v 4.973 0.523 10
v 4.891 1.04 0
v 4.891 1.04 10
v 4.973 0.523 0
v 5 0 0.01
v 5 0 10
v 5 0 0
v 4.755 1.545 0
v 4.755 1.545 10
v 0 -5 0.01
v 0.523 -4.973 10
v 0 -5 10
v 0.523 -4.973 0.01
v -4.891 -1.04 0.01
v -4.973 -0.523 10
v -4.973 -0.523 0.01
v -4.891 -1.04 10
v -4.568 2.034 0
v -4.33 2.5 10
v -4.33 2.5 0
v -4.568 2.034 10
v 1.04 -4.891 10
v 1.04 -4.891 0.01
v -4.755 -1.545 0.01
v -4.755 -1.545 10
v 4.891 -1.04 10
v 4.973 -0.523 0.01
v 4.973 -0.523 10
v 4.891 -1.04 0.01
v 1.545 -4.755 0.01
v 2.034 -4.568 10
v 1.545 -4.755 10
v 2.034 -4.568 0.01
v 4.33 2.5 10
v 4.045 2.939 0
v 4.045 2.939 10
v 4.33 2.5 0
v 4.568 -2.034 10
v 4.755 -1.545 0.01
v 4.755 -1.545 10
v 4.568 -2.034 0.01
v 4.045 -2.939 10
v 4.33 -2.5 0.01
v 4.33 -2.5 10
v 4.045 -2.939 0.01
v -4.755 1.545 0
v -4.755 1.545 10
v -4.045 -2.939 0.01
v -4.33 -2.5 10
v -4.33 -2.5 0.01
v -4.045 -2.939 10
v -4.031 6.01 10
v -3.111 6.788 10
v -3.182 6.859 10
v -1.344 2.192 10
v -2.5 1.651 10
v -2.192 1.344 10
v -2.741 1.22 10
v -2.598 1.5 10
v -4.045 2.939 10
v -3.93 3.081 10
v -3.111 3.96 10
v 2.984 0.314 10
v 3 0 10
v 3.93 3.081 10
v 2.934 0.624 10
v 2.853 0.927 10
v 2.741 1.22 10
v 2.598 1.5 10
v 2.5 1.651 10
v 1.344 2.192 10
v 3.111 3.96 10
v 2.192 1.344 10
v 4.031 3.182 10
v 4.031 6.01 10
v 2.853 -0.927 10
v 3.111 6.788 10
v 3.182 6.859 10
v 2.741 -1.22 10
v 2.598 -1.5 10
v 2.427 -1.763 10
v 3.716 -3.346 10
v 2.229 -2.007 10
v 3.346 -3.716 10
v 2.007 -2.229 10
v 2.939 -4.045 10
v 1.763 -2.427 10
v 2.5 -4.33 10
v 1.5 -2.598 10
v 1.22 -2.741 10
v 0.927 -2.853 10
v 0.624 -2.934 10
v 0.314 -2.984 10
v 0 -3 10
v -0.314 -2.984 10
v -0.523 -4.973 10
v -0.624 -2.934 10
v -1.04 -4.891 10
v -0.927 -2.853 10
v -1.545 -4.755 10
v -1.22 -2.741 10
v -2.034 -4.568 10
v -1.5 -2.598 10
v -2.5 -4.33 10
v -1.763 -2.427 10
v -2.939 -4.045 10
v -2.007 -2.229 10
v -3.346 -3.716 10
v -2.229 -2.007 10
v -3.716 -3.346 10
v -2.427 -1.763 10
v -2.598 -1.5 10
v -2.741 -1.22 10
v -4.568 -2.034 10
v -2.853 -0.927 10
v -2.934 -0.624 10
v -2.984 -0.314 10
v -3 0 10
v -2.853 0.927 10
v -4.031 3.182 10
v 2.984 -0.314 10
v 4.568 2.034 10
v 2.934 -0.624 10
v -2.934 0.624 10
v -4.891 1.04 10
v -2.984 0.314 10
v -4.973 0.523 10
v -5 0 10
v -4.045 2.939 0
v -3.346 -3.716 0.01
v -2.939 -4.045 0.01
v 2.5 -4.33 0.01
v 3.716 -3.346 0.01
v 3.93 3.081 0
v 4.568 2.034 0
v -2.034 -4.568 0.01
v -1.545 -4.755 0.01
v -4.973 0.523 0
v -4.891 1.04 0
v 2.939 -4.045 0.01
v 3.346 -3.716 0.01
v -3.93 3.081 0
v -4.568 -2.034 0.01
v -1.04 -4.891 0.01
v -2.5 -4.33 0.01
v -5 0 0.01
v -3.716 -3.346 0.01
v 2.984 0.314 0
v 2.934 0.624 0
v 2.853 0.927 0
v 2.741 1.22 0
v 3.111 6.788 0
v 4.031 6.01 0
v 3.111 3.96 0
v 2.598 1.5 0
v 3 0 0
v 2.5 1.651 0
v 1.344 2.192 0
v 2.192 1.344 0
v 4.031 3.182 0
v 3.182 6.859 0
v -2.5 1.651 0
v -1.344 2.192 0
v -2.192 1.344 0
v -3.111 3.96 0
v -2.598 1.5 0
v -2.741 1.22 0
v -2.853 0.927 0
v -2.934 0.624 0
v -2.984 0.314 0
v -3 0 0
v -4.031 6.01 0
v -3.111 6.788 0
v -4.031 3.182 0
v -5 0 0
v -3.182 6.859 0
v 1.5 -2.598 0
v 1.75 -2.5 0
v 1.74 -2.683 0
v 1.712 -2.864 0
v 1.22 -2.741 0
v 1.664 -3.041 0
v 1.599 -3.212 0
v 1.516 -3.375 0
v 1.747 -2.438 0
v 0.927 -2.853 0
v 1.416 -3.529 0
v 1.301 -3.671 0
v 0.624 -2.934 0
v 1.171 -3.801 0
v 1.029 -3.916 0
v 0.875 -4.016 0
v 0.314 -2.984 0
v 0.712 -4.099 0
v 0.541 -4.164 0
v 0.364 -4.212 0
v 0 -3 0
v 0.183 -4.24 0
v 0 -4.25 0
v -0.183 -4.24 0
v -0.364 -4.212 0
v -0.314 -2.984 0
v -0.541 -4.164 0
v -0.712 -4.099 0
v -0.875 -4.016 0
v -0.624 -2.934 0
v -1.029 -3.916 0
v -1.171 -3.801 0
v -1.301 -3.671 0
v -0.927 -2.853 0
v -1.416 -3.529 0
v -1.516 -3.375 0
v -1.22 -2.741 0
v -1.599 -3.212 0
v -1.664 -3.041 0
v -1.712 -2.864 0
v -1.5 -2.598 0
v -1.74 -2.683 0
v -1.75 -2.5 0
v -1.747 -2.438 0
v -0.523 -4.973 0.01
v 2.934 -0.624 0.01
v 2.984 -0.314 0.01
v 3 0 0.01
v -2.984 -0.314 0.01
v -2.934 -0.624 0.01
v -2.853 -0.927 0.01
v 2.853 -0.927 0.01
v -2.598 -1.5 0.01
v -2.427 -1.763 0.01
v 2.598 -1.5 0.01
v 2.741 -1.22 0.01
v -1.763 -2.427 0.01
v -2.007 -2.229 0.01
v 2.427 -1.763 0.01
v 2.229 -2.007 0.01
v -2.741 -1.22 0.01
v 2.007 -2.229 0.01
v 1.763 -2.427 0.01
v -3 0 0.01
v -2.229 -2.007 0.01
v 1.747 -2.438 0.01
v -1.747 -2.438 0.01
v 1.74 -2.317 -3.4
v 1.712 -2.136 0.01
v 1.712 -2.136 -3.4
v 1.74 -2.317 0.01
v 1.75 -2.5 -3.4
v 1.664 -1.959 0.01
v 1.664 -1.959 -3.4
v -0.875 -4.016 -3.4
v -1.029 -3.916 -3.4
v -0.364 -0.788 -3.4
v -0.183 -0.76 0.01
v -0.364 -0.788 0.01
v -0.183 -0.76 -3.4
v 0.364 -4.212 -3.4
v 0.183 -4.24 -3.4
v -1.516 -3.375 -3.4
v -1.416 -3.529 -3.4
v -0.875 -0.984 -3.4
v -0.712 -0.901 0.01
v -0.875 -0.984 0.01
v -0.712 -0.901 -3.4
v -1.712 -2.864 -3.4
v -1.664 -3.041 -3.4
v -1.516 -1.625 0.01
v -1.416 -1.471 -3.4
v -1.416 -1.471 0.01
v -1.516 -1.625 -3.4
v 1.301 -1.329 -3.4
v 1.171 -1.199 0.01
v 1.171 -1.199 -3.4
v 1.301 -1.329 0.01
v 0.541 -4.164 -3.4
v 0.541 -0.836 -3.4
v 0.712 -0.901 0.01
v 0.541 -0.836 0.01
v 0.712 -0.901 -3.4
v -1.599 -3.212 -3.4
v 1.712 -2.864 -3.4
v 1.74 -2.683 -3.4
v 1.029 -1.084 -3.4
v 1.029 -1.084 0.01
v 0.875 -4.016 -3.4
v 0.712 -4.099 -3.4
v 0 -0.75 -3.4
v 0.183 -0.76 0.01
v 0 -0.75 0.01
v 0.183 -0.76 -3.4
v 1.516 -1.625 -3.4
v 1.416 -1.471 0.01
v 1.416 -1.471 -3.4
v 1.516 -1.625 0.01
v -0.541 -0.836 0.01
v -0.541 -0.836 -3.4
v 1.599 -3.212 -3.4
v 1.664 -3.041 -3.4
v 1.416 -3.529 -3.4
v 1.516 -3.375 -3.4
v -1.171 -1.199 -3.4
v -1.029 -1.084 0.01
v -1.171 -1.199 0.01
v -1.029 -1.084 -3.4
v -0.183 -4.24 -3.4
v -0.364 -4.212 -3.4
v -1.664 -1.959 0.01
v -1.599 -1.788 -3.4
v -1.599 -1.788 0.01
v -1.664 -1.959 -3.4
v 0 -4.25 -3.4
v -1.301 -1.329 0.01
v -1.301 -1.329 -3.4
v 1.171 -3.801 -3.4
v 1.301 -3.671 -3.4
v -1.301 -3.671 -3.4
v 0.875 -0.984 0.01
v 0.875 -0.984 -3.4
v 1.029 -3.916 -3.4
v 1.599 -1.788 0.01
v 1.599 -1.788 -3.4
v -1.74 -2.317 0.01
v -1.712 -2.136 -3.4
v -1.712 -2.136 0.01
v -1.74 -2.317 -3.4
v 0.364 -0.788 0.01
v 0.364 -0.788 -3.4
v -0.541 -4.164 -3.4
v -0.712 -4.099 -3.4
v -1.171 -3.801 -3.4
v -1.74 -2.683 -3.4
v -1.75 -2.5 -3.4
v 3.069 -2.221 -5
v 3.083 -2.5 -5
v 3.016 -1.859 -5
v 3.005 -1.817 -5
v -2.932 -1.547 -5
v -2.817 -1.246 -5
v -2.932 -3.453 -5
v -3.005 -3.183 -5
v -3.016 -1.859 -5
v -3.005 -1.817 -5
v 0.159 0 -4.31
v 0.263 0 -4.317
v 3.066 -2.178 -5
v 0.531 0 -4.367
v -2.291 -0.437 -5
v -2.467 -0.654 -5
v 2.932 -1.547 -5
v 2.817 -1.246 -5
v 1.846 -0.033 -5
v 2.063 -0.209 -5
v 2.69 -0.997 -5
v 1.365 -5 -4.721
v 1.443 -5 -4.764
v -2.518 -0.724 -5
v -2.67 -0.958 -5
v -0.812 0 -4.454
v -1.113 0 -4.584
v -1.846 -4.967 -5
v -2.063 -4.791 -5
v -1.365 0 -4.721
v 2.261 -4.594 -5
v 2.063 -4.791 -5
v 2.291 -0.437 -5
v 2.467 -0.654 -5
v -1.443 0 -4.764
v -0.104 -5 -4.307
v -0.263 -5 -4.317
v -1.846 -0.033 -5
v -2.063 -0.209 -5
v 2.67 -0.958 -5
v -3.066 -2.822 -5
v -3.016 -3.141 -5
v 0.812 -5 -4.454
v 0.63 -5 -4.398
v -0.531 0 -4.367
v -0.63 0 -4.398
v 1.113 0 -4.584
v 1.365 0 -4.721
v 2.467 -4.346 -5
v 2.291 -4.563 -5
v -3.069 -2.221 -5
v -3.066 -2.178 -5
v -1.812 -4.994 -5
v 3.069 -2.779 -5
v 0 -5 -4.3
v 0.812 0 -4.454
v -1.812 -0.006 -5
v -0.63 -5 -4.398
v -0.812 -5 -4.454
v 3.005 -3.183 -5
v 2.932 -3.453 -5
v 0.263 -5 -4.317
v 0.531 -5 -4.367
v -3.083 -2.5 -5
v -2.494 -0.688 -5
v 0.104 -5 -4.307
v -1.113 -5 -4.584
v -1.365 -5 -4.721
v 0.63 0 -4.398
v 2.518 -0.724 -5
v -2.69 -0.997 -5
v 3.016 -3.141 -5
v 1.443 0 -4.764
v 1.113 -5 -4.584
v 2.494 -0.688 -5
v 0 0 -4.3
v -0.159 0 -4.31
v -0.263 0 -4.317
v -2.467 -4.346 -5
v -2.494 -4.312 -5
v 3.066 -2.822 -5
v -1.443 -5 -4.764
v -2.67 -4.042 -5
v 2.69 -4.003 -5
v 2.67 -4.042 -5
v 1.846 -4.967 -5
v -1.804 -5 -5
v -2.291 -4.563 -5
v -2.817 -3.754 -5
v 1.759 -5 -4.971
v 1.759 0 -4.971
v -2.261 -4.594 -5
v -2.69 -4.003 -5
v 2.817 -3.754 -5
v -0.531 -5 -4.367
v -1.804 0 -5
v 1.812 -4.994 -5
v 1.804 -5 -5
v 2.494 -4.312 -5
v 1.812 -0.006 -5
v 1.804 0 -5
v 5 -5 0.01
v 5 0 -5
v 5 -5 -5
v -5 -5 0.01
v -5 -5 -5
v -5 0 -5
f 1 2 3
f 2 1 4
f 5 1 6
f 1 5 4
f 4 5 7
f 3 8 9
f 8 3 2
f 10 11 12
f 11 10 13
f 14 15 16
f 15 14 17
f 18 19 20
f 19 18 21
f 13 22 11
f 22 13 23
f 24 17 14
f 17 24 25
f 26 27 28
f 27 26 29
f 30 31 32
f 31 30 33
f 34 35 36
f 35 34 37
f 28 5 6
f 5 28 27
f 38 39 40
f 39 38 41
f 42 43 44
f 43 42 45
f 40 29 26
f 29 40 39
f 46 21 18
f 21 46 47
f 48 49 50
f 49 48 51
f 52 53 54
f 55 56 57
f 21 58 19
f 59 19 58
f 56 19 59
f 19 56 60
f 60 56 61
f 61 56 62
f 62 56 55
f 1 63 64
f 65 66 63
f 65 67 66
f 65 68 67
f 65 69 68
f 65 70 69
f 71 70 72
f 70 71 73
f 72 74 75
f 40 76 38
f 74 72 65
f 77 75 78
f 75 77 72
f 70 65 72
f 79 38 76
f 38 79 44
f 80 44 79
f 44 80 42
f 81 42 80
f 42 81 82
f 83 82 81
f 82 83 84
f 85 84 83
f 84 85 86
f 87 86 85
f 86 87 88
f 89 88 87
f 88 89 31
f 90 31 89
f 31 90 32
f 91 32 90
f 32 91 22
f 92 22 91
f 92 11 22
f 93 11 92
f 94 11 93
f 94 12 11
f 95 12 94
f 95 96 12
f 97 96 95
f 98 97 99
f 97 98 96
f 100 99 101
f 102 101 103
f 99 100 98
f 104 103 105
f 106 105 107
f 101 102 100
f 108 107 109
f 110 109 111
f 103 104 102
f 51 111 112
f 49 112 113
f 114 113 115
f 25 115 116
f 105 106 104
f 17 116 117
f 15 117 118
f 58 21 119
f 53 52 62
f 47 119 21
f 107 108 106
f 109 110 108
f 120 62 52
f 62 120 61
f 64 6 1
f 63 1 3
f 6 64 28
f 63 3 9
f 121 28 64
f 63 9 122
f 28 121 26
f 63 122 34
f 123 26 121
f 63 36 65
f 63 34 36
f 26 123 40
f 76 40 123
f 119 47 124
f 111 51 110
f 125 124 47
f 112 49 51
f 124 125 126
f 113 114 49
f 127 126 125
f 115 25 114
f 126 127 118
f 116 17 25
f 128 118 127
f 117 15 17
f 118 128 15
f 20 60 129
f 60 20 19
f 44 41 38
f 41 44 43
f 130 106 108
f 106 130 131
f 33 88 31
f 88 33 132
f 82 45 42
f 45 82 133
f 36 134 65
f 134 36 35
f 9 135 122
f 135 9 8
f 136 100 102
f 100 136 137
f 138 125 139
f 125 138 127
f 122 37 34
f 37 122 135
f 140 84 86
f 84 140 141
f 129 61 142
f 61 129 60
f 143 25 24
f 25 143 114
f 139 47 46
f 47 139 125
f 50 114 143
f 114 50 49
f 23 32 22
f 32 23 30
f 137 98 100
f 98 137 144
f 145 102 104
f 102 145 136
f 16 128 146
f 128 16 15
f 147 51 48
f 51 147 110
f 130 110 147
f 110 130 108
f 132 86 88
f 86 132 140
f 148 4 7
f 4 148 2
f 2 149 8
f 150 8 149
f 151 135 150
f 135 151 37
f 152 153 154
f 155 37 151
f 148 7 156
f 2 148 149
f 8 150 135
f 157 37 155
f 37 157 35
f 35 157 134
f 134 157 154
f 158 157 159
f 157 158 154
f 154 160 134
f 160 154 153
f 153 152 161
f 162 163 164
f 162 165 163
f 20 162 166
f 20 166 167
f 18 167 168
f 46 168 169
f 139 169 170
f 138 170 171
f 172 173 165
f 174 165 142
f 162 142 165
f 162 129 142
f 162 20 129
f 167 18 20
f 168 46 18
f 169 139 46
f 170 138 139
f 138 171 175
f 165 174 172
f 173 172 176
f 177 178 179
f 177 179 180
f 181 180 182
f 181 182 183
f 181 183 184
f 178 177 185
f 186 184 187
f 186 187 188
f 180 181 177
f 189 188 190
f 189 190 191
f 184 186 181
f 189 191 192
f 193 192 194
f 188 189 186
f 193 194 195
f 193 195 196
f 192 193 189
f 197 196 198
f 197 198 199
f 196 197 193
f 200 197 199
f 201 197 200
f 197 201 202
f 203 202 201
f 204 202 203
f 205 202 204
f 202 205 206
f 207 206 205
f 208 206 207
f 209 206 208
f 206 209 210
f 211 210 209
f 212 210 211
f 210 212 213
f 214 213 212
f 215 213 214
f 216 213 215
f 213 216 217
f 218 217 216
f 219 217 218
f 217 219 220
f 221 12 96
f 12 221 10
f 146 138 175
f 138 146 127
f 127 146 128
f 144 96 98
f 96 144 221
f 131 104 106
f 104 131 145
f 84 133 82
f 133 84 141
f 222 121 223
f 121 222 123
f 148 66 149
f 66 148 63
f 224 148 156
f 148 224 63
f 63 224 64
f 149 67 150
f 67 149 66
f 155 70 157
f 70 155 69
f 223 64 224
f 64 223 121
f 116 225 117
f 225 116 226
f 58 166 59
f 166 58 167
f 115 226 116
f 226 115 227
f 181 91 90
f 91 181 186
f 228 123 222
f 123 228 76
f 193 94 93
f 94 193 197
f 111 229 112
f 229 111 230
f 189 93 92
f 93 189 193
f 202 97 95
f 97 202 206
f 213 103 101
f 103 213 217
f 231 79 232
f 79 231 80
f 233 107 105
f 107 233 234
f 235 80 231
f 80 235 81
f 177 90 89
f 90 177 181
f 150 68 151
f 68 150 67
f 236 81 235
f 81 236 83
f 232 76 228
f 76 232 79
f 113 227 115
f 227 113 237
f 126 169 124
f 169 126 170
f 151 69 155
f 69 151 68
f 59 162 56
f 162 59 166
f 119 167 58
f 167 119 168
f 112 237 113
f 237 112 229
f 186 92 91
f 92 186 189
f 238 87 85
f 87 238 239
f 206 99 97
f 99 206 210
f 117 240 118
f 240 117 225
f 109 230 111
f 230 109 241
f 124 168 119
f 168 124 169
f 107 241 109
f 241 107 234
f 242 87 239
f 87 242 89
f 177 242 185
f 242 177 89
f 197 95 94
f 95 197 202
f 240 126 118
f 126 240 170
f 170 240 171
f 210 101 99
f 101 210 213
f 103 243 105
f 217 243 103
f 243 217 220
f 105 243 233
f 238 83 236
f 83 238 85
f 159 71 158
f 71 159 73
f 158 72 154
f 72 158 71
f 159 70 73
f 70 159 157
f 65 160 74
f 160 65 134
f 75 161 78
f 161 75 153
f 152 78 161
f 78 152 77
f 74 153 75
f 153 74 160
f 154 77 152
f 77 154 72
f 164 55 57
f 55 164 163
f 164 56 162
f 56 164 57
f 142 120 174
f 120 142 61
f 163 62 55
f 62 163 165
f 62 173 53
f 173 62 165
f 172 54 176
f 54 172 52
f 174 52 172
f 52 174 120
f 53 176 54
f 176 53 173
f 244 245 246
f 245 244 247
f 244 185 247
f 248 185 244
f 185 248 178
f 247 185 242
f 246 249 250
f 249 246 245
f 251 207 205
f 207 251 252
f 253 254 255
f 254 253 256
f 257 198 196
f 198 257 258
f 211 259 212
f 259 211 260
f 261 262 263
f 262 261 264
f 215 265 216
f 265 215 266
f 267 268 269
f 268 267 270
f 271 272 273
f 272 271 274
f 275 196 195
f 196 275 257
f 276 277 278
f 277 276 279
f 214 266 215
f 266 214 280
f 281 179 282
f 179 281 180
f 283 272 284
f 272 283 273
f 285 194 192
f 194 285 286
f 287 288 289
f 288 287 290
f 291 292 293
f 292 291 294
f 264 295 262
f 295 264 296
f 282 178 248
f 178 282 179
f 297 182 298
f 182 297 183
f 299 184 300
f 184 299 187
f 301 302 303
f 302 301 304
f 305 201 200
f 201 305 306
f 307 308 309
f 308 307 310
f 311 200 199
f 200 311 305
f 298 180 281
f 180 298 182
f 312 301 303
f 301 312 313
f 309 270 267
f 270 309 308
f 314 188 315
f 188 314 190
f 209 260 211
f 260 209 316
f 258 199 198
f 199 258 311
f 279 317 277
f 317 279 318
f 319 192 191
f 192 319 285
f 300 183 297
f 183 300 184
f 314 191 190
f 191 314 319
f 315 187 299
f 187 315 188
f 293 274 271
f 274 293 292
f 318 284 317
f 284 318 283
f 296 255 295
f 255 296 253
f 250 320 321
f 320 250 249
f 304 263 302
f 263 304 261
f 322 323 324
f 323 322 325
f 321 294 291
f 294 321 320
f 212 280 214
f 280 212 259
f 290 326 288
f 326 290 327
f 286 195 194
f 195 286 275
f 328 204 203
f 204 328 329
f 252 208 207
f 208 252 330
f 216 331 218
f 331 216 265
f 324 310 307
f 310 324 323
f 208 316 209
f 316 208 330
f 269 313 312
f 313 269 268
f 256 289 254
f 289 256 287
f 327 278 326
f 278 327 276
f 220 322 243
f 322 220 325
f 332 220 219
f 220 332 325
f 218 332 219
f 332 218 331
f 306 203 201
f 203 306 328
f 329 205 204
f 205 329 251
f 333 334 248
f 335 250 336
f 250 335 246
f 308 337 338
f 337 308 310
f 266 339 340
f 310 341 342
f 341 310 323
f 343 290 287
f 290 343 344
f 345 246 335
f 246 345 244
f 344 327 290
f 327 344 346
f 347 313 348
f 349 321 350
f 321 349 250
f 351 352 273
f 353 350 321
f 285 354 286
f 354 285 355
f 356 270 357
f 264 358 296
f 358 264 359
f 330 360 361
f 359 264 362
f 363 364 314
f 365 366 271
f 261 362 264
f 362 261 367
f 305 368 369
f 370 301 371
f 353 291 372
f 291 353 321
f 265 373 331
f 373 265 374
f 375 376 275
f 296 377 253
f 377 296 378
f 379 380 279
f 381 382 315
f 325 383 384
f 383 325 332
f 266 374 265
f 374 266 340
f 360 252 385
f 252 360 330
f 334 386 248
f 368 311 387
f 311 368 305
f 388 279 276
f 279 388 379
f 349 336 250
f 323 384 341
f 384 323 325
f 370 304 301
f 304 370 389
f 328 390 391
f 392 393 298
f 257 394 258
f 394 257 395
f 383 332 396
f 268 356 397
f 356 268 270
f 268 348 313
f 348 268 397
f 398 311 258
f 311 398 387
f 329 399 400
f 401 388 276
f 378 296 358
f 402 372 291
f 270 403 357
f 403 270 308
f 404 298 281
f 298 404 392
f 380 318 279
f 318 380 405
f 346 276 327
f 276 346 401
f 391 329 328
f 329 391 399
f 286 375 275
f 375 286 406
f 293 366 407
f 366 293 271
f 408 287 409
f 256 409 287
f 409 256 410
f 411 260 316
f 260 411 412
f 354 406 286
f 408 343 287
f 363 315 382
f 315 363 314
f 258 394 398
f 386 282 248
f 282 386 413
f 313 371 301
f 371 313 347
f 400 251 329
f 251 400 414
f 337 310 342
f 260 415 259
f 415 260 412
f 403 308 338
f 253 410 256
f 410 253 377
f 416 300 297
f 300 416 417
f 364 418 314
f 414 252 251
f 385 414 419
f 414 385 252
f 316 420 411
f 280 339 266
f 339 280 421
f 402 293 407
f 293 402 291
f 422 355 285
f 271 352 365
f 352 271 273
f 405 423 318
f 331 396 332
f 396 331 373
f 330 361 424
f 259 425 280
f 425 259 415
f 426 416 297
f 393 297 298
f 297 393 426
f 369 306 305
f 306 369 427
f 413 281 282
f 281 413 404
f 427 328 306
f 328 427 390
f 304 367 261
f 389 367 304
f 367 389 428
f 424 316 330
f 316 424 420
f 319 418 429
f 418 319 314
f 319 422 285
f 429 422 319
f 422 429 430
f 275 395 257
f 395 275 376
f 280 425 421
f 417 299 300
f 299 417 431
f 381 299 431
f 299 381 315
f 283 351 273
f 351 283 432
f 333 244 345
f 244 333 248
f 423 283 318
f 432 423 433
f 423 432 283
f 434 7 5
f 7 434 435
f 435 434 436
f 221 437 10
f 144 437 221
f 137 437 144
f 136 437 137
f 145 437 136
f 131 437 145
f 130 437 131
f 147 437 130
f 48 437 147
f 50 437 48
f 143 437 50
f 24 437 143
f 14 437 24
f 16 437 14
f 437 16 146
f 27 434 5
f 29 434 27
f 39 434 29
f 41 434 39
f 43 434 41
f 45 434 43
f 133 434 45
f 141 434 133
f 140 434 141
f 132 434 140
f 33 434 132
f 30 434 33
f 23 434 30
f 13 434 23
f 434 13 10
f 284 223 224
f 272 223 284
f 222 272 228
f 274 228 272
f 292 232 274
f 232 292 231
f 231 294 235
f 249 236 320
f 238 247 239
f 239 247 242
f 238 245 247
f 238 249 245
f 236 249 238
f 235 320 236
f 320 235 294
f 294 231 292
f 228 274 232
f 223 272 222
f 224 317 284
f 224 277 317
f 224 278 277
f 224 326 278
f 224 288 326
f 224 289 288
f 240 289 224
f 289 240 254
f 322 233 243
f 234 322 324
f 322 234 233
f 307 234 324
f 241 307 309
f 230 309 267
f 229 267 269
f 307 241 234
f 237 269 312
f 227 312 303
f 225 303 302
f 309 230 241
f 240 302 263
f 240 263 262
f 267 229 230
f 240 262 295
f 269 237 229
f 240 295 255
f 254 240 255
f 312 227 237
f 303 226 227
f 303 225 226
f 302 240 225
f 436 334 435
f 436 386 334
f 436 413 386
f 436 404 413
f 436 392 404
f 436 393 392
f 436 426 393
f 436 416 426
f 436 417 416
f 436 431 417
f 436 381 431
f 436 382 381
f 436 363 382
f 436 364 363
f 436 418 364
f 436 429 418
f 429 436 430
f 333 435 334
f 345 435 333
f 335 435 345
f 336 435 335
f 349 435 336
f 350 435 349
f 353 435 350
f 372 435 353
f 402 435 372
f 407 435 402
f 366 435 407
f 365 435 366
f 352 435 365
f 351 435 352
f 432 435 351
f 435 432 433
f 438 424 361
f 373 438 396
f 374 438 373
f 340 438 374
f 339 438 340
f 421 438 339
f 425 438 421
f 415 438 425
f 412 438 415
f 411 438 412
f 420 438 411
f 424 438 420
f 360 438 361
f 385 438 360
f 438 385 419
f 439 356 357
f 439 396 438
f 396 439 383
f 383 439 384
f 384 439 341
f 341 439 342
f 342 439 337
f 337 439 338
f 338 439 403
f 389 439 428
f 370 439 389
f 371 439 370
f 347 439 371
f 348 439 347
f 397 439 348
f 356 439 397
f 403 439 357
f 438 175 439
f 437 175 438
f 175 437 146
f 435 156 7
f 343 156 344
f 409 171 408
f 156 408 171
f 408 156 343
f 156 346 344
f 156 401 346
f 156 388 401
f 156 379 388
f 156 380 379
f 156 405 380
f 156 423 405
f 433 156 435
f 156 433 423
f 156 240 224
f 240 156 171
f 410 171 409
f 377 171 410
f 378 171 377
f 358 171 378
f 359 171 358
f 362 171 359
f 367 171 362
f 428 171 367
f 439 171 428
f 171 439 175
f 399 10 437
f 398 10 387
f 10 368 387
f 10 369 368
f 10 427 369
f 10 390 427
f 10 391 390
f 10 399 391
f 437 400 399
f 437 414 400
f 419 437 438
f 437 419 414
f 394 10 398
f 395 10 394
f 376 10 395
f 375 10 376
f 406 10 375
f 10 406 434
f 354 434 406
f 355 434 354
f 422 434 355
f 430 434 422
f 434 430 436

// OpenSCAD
// =============================================================================
// Parametric Cable Management Clip
// =============================================================================
// Description : A spring-action cable clip with screw mounting hole.
//               Works for various cable diameters. The clip grips the cable
//               via two flexible arms that deflect when the cable is pressed in.
// Author      : 3D LLM Generator
// License     : MIT
//
// Print Settings (FDM):
//   Layer Height : 0.16 - 0.2 mm
//   Infill       : 100% (small part, needs strength)
//   Supports     : Not required
//   Material     : PETG or TPU recommended (PLA is brittle for spring arms)
//   Nozzle       : 0.4 mm
//   Orientation  : Print flat on the base
//   Notes        : Print slowly for the thin spring arms (~30 mm/s)
// =============================================================================

// ─── Parameters ──────────────────────────────────────────────────────────────

// Cable
cable_diameter = 6;     // [2:0.5:20] Diameter of the cable in mm

// Clip geometry
clip_wall       = 2.0;  // [1.5:0.5:4] Wall thickness around cable channel
clip_depth      = 10;   // [6:20]      Depth of clip body (Z height)
grip_percentage = 75;   // [50:90]     How much of the cable circumference is gripped (%)

// Spring arm settings
arm_thickness = 1.2;    // [0.8:0.1:2.0] Thickness of each spring arm
arm_gap       = 1.5;    // [1.0:0.5:3.0] Gap between arm tips (cable entry slot)
arm_flare     = 2.0;    // [0:4]         Outward flare at arm tips for easy insertion

// Mounting hole
mount_hole_diameter = 3.5;  // [0:0.5:6] Screw hole diameter (0 = no hole)
mount_pad_width     = 10;   // [8:20]    Width of the mounting pad
mount_pad_height    = 5;    // [3:10]    Height of the mounting pad below clip

// Resolution
$fn = 60;

// ─── Derived Values ──────────────────────────────────────────────────────────

cable_r    = cable_diameter / 2;
clip_r     = cable_r + clip_wall;
grip_angle = grip_percentage / 100 * 360;
open_angle = 360 - grip_angle;

// Total body width and height for positioning
body_width = clip_r * 2;

// ─── Modules ─────────────────────────────────────────────────────────────────

// The main clip body: a C-shaped channel that wraps around the cable
module clip_body() {
    difference() {
        // Outer cylinder
        cylinder(r = clip_r, h = clip_depth);

        // Inner channel (cable void) — runs full length + clearance
        translate([0, 0, -0.5])
            cylinder(r = cable_r, h = clip_depth + 1);

        // Cut away the opening at the top for cable insertion
        // The opening faces +Y (top)
        rotate([0, 0, 90 - open_angle / 2])
            wedge_cut(clip_r + 1, open_angle, clip_depth);
    }
}

// A pie-slice shaped cutter used to open the clip channel
module wedge_cut(r, angle, h) {
    // Use intersection of rotated planes to cut a wedge
    translate([0, 0, -0.5])
        linear_extrude(height = h + 1)
            polygon(points = concat(
                [[0, 0]],
                [for (a = [0 : 1 : angle])
                    [r * cos(a), r * sin(a)]
                ]
            ));
}

// Flexible spring arms at the opening that deflect to let the cable snap in
module spring_arms() {
    arm_length = clip_r + arm_flare;

    for (side = [-1, 1]) {
        rotate([0, 0, 90 + side * (open_angle / 2)])
            translate([cable_r - 0.5, -arm_thickness / 2, 0]) {
                // Main arm body
                cube([clip_wall + 0.5, arm_thickness, clip_depth]);

                // Flared tip for easy cable insertion
                translate([clip_wall + 0.5, 0, 0])
                    hull() {
                        cube([0.1, arm_thickness, clip_depth]);
                        translate([arm_flare, -side * arm_flare, 0])
                            cube([0.1, arm_thickness, clip_depth]);
                    }
            }
    }
}

// Flat base pad with screw mounting hole
module mounting_base() {
    pad_length = mount_pad_width;
    pad_total_h = mount_pad_height;

    translate([-pad_length / 2, -clip_r, -pad_total_h])
        difference() {
            // Rectangular mounting pad
            cube([pad_length, clip_r, pad_total_h + 0.01]);

            // Screw hole (vertical, centered in pad)
            if (mount_hole_diameter > 0) {
                translate([pad_length / 2, clip_r / 2, -0.5])
                    cylinder(d = mount_hole_diameter, h = pad_total_h + 1);

                // Countersink on bottom
                translate([pad_length / 2, clip_r / 2, -0.5])
                    cylinder(
                        d1 = mount_hole_diameter * 2,
                        d2 = mount_hole_diameter,
                        h = mount_hole_diameter * 0.6
                    );
            }
        }
}

// ─── Assembly ────────────────────────────────────────────────────────────────

module cable_clip() {
    color("OliveDrab") {
        clip_body();
        spring_arms();
        mounting_base();
    }
}

// ─── Render ──────────────────────────────────────────────────────────────────

cable_clip();
